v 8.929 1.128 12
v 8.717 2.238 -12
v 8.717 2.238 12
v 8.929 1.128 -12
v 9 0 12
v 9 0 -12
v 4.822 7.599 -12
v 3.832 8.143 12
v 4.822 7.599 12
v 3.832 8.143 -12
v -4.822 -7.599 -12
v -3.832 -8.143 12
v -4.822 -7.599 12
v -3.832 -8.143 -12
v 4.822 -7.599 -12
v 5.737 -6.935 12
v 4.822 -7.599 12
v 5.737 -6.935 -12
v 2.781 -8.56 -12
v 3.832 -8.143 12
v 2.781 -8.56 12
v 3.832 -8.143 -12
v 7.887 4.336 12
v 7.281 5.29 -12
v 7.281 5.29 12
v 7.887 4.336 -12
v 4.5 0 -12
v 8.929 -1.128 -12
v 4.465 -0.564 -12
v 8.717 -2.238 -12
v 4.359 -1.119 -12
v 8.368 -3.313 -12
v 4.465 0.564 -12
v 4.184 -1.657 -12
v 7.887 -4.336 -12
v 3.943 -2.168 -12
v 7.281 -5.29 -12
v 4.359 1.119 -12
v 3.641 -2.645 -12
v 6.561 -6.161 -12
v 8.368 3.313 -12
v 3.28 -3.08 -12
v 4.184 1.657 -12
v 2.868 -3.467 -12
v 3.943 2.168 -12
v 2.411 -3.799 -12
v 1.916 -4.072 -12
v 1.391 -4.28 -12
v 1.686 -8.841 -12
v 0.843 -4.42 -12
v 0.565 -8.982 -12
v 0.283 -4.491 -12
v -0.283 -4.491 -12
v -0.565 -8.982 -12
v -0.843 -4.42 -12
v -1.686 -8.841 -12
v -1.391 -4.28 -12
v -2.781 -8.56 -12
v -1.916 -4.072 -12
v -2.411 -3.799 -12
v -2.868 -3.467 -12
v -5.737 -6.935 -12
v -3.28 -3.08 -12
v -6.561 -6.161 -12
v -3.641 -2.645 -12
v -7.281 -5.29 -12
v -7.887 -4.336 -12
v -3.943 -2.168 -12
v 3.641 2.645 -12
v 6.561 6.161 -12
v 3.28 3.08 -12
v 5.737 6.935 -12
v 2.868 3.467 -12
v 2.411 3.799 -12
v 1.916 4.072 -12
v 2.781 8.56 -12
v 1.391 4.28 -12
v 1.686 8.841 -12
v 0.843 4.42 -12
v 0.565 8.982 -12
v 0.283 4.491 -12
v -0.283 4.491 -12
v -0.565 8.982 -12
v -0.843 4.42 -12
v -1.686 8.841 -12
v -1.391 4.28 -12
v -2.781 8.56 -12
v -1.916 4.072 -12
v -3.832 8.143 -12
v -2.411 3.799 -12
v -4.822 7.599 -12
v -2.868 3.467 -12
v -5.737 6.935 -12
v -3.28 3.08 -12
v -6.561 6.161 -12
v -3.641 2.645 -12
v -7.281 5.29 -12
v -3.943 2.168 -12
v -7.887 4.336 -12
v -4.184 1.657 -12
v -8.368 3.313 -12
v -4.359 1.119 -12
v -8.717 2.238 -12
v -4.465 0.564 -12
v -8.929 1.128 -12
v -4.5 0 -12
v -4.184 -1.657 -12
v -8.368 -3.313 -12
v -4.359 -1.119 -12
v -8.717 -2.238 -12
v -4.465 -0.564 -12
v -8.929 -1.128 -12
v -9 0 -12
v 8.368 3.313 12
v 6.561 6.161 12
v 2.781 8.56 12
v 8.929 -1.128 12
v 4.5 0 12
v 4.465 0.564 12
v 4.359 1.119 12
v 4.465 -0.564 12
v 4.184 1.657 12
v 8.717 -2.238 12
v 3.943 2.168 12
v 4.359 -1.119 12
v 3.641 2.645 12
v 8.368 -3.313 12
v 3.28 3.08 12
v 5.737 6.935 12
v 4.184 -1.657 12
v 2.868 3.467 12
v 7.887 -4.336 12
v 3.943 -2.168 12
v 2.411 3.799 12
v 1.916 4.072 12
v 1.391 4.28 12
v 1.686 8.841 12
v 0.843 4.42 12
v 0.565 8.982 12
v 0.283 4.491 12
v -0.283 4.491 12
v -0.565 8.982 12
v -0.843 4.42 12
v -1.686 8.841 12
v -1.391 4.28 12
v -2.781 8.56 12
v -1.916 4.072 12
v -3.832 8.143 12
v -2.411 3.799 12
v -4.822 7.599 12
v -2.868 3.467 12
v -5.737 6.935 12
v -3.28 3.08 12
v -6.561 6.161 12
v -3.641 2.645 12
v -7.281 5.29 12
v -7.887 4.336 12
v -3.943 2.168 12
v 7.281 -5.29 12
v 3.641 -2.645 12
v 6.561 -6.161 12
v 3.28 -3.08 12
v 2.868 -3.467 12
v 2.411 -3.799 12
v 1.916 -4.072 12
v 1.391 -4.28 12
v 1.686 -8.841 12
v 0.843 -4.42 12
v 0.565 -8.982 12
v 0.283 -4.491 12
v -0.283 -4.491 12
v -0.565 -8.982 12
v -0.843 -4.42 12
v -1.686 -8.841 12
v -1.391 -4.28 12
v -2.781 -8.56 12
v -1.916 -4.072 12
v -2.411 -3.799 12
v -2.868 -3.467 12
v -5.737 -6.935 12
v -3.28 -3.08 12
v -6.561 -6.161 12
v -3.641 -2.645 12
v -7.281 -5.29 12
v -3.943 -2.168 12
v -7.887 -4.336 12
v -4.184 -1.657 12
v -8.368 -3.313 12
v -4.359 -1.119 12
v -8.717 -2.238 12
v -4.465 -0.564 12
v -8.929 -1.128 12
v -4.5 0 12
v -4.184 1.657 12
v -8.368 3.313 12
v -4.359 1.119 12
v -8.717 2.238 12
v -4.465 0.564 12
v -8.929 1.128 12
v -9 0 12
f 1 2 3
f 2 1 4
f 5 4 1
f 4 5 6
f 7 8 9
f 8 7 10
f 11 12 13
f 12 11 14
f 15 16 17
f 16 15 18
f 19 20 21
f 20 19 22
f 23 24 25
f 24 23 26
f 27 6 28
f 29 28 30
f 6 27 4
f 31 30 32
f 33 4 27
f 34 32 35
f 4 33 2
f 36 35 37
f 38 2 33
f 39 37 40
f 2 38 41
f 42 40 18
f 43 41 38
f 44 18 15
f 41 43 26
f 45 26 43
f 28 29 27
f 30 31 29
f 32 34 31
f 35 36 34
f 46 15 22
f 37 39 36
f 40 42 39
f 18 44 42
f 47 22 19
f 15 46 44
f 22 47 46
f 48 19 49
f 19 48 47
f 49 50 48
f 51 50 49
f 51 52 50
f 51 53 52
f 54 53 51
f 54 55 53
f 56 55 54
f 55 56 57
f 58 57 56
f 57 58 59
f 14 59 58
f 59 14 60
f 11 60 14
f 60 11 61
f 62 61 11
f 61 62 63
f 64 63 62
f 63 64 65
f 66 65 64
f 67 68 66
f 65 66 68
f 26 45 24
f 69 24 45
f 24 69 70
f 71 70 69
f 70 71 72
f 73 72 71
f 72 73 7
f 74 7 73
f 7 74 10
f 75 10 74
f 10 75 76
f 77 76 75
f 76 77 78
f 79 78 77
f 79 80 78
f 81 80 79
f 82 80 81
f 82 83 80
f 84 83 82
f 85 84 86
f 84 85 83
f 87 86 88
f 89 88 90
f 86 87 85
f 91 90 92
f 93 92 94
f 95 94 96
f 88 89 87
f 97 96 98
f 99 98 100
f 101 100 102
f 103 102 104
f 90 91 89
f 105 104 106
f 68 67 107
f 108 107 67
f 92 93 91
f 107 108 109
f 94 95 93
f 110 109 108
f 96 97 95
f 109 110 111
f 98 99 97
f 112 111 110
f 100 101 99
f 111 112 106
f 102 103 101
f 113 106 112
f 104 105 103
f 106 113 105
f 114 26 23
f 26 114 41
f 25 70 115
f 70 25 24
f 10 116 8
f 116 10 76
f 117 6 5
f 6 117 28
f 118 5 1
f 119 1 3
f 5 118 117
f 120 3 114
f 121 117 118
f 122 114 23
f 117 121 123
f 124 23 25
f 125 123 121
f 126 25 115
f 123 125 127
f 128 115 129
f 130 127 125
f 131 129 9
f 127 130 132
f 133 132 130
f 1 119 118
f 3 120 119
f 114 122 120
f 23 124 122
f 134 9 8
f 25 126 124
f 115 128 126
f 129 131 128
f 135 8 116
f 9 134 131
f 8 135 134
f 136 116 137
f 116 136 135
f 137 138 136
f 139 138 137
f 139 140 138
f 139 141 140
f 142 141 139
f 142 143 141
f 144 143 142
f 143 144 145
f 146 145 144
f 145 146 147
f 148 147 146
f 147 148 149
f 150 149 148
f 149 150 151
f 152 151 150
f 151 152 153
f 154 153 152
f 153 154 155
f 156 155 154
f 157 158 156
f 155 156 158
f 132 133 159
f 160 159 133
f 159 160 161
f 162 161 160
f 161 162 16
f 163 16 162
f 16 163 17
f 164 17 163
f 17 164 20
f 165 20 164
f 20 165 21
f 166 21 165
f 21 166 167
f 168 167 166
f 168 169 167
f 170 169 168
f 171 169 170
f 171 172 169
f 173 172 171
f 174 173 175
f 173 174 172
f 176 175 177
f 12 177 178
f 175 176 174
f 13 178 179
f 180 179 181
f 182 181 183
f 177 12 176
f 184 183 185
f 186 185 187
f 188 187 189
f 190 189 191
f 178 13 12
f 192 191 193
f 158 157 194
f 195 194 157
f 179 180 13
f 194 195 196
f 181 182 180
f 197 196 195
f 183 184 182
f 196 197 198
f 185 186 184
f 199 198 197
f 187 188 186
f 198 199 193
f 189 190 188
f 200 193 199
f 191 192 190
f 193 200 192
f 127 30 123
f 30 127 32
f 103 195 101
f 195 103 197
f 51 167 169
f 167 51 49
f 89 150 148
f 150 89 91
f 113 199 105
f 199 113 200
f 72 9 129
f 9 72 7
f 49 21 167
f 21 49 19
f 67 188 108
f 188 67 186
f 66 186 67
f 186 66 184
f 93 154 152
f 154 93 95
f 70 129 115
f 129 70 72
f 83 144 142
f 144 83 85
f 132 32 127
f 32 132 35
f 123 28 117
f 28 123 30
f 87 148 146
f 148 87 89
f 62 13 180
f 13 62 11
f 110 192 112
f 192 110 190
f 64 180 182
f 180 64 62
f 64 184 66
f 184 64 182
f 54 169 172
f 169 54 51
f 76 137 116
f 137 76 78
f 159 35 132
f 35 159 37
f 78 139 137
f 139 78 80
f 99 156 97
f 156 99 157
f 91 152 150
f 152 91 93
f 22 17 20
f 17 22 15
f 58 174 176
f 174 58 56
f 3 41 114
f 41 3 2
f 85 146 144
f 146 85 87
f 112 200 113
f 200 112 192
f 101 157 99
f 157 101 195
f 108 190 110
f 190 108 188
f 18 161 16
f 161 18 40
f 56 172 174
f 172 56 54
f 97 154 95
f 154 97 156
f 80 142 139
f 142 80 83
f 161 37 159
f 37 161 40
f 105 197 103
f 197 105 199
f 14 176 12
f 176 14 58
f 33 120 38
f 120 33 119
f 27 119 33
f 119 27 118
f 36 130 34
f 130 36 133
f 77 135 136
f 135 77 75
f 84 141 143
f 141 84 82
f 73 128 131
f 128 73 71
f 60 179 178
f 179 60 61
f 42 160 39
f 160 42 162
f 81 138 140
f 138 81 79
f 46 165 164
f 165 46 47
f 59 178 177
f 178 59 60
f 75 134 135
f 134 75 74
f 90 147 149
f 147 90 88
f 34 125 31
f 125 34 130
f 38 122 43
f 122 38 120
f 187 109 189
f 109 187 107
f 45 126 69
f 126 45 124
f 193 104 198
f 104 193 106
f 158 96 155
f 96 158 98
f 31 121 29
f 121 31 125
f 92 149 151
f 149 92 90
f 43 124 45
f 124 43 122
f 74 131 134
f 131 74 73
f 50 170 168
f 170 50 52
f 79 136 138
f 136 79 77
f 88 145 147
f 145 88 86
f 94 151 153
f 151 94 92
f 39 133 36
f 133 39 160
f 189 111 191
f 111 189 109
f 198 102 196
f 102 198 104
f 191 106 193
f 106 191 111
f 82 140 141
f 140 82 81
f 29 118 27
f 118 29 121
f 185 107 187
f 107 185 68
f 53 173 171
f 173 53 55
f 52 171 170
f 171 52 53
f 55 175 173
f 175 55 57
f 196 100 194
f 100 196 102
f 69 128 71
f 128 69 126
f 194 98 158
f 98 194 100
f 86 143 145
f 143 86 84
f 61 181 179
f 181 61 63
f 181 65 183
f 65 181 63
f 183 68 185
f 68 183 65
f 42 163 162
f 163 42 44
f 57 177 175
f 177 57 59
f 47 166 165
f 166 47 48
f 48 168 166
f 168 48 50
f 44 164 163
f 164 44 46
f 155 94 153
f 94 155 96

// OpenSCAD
$fn = 50;


difference() {
	union() {
		translate(v = [0, 0, -12.0000000000]) {
			cylinder(h = 24, r = 9.0000000000);
		}
	}
	union() {
		translate(v = [0, 0, -100.0000000000]) {
			cylinder(h = 200, r = 4.5000000000);
		}
	}
}
